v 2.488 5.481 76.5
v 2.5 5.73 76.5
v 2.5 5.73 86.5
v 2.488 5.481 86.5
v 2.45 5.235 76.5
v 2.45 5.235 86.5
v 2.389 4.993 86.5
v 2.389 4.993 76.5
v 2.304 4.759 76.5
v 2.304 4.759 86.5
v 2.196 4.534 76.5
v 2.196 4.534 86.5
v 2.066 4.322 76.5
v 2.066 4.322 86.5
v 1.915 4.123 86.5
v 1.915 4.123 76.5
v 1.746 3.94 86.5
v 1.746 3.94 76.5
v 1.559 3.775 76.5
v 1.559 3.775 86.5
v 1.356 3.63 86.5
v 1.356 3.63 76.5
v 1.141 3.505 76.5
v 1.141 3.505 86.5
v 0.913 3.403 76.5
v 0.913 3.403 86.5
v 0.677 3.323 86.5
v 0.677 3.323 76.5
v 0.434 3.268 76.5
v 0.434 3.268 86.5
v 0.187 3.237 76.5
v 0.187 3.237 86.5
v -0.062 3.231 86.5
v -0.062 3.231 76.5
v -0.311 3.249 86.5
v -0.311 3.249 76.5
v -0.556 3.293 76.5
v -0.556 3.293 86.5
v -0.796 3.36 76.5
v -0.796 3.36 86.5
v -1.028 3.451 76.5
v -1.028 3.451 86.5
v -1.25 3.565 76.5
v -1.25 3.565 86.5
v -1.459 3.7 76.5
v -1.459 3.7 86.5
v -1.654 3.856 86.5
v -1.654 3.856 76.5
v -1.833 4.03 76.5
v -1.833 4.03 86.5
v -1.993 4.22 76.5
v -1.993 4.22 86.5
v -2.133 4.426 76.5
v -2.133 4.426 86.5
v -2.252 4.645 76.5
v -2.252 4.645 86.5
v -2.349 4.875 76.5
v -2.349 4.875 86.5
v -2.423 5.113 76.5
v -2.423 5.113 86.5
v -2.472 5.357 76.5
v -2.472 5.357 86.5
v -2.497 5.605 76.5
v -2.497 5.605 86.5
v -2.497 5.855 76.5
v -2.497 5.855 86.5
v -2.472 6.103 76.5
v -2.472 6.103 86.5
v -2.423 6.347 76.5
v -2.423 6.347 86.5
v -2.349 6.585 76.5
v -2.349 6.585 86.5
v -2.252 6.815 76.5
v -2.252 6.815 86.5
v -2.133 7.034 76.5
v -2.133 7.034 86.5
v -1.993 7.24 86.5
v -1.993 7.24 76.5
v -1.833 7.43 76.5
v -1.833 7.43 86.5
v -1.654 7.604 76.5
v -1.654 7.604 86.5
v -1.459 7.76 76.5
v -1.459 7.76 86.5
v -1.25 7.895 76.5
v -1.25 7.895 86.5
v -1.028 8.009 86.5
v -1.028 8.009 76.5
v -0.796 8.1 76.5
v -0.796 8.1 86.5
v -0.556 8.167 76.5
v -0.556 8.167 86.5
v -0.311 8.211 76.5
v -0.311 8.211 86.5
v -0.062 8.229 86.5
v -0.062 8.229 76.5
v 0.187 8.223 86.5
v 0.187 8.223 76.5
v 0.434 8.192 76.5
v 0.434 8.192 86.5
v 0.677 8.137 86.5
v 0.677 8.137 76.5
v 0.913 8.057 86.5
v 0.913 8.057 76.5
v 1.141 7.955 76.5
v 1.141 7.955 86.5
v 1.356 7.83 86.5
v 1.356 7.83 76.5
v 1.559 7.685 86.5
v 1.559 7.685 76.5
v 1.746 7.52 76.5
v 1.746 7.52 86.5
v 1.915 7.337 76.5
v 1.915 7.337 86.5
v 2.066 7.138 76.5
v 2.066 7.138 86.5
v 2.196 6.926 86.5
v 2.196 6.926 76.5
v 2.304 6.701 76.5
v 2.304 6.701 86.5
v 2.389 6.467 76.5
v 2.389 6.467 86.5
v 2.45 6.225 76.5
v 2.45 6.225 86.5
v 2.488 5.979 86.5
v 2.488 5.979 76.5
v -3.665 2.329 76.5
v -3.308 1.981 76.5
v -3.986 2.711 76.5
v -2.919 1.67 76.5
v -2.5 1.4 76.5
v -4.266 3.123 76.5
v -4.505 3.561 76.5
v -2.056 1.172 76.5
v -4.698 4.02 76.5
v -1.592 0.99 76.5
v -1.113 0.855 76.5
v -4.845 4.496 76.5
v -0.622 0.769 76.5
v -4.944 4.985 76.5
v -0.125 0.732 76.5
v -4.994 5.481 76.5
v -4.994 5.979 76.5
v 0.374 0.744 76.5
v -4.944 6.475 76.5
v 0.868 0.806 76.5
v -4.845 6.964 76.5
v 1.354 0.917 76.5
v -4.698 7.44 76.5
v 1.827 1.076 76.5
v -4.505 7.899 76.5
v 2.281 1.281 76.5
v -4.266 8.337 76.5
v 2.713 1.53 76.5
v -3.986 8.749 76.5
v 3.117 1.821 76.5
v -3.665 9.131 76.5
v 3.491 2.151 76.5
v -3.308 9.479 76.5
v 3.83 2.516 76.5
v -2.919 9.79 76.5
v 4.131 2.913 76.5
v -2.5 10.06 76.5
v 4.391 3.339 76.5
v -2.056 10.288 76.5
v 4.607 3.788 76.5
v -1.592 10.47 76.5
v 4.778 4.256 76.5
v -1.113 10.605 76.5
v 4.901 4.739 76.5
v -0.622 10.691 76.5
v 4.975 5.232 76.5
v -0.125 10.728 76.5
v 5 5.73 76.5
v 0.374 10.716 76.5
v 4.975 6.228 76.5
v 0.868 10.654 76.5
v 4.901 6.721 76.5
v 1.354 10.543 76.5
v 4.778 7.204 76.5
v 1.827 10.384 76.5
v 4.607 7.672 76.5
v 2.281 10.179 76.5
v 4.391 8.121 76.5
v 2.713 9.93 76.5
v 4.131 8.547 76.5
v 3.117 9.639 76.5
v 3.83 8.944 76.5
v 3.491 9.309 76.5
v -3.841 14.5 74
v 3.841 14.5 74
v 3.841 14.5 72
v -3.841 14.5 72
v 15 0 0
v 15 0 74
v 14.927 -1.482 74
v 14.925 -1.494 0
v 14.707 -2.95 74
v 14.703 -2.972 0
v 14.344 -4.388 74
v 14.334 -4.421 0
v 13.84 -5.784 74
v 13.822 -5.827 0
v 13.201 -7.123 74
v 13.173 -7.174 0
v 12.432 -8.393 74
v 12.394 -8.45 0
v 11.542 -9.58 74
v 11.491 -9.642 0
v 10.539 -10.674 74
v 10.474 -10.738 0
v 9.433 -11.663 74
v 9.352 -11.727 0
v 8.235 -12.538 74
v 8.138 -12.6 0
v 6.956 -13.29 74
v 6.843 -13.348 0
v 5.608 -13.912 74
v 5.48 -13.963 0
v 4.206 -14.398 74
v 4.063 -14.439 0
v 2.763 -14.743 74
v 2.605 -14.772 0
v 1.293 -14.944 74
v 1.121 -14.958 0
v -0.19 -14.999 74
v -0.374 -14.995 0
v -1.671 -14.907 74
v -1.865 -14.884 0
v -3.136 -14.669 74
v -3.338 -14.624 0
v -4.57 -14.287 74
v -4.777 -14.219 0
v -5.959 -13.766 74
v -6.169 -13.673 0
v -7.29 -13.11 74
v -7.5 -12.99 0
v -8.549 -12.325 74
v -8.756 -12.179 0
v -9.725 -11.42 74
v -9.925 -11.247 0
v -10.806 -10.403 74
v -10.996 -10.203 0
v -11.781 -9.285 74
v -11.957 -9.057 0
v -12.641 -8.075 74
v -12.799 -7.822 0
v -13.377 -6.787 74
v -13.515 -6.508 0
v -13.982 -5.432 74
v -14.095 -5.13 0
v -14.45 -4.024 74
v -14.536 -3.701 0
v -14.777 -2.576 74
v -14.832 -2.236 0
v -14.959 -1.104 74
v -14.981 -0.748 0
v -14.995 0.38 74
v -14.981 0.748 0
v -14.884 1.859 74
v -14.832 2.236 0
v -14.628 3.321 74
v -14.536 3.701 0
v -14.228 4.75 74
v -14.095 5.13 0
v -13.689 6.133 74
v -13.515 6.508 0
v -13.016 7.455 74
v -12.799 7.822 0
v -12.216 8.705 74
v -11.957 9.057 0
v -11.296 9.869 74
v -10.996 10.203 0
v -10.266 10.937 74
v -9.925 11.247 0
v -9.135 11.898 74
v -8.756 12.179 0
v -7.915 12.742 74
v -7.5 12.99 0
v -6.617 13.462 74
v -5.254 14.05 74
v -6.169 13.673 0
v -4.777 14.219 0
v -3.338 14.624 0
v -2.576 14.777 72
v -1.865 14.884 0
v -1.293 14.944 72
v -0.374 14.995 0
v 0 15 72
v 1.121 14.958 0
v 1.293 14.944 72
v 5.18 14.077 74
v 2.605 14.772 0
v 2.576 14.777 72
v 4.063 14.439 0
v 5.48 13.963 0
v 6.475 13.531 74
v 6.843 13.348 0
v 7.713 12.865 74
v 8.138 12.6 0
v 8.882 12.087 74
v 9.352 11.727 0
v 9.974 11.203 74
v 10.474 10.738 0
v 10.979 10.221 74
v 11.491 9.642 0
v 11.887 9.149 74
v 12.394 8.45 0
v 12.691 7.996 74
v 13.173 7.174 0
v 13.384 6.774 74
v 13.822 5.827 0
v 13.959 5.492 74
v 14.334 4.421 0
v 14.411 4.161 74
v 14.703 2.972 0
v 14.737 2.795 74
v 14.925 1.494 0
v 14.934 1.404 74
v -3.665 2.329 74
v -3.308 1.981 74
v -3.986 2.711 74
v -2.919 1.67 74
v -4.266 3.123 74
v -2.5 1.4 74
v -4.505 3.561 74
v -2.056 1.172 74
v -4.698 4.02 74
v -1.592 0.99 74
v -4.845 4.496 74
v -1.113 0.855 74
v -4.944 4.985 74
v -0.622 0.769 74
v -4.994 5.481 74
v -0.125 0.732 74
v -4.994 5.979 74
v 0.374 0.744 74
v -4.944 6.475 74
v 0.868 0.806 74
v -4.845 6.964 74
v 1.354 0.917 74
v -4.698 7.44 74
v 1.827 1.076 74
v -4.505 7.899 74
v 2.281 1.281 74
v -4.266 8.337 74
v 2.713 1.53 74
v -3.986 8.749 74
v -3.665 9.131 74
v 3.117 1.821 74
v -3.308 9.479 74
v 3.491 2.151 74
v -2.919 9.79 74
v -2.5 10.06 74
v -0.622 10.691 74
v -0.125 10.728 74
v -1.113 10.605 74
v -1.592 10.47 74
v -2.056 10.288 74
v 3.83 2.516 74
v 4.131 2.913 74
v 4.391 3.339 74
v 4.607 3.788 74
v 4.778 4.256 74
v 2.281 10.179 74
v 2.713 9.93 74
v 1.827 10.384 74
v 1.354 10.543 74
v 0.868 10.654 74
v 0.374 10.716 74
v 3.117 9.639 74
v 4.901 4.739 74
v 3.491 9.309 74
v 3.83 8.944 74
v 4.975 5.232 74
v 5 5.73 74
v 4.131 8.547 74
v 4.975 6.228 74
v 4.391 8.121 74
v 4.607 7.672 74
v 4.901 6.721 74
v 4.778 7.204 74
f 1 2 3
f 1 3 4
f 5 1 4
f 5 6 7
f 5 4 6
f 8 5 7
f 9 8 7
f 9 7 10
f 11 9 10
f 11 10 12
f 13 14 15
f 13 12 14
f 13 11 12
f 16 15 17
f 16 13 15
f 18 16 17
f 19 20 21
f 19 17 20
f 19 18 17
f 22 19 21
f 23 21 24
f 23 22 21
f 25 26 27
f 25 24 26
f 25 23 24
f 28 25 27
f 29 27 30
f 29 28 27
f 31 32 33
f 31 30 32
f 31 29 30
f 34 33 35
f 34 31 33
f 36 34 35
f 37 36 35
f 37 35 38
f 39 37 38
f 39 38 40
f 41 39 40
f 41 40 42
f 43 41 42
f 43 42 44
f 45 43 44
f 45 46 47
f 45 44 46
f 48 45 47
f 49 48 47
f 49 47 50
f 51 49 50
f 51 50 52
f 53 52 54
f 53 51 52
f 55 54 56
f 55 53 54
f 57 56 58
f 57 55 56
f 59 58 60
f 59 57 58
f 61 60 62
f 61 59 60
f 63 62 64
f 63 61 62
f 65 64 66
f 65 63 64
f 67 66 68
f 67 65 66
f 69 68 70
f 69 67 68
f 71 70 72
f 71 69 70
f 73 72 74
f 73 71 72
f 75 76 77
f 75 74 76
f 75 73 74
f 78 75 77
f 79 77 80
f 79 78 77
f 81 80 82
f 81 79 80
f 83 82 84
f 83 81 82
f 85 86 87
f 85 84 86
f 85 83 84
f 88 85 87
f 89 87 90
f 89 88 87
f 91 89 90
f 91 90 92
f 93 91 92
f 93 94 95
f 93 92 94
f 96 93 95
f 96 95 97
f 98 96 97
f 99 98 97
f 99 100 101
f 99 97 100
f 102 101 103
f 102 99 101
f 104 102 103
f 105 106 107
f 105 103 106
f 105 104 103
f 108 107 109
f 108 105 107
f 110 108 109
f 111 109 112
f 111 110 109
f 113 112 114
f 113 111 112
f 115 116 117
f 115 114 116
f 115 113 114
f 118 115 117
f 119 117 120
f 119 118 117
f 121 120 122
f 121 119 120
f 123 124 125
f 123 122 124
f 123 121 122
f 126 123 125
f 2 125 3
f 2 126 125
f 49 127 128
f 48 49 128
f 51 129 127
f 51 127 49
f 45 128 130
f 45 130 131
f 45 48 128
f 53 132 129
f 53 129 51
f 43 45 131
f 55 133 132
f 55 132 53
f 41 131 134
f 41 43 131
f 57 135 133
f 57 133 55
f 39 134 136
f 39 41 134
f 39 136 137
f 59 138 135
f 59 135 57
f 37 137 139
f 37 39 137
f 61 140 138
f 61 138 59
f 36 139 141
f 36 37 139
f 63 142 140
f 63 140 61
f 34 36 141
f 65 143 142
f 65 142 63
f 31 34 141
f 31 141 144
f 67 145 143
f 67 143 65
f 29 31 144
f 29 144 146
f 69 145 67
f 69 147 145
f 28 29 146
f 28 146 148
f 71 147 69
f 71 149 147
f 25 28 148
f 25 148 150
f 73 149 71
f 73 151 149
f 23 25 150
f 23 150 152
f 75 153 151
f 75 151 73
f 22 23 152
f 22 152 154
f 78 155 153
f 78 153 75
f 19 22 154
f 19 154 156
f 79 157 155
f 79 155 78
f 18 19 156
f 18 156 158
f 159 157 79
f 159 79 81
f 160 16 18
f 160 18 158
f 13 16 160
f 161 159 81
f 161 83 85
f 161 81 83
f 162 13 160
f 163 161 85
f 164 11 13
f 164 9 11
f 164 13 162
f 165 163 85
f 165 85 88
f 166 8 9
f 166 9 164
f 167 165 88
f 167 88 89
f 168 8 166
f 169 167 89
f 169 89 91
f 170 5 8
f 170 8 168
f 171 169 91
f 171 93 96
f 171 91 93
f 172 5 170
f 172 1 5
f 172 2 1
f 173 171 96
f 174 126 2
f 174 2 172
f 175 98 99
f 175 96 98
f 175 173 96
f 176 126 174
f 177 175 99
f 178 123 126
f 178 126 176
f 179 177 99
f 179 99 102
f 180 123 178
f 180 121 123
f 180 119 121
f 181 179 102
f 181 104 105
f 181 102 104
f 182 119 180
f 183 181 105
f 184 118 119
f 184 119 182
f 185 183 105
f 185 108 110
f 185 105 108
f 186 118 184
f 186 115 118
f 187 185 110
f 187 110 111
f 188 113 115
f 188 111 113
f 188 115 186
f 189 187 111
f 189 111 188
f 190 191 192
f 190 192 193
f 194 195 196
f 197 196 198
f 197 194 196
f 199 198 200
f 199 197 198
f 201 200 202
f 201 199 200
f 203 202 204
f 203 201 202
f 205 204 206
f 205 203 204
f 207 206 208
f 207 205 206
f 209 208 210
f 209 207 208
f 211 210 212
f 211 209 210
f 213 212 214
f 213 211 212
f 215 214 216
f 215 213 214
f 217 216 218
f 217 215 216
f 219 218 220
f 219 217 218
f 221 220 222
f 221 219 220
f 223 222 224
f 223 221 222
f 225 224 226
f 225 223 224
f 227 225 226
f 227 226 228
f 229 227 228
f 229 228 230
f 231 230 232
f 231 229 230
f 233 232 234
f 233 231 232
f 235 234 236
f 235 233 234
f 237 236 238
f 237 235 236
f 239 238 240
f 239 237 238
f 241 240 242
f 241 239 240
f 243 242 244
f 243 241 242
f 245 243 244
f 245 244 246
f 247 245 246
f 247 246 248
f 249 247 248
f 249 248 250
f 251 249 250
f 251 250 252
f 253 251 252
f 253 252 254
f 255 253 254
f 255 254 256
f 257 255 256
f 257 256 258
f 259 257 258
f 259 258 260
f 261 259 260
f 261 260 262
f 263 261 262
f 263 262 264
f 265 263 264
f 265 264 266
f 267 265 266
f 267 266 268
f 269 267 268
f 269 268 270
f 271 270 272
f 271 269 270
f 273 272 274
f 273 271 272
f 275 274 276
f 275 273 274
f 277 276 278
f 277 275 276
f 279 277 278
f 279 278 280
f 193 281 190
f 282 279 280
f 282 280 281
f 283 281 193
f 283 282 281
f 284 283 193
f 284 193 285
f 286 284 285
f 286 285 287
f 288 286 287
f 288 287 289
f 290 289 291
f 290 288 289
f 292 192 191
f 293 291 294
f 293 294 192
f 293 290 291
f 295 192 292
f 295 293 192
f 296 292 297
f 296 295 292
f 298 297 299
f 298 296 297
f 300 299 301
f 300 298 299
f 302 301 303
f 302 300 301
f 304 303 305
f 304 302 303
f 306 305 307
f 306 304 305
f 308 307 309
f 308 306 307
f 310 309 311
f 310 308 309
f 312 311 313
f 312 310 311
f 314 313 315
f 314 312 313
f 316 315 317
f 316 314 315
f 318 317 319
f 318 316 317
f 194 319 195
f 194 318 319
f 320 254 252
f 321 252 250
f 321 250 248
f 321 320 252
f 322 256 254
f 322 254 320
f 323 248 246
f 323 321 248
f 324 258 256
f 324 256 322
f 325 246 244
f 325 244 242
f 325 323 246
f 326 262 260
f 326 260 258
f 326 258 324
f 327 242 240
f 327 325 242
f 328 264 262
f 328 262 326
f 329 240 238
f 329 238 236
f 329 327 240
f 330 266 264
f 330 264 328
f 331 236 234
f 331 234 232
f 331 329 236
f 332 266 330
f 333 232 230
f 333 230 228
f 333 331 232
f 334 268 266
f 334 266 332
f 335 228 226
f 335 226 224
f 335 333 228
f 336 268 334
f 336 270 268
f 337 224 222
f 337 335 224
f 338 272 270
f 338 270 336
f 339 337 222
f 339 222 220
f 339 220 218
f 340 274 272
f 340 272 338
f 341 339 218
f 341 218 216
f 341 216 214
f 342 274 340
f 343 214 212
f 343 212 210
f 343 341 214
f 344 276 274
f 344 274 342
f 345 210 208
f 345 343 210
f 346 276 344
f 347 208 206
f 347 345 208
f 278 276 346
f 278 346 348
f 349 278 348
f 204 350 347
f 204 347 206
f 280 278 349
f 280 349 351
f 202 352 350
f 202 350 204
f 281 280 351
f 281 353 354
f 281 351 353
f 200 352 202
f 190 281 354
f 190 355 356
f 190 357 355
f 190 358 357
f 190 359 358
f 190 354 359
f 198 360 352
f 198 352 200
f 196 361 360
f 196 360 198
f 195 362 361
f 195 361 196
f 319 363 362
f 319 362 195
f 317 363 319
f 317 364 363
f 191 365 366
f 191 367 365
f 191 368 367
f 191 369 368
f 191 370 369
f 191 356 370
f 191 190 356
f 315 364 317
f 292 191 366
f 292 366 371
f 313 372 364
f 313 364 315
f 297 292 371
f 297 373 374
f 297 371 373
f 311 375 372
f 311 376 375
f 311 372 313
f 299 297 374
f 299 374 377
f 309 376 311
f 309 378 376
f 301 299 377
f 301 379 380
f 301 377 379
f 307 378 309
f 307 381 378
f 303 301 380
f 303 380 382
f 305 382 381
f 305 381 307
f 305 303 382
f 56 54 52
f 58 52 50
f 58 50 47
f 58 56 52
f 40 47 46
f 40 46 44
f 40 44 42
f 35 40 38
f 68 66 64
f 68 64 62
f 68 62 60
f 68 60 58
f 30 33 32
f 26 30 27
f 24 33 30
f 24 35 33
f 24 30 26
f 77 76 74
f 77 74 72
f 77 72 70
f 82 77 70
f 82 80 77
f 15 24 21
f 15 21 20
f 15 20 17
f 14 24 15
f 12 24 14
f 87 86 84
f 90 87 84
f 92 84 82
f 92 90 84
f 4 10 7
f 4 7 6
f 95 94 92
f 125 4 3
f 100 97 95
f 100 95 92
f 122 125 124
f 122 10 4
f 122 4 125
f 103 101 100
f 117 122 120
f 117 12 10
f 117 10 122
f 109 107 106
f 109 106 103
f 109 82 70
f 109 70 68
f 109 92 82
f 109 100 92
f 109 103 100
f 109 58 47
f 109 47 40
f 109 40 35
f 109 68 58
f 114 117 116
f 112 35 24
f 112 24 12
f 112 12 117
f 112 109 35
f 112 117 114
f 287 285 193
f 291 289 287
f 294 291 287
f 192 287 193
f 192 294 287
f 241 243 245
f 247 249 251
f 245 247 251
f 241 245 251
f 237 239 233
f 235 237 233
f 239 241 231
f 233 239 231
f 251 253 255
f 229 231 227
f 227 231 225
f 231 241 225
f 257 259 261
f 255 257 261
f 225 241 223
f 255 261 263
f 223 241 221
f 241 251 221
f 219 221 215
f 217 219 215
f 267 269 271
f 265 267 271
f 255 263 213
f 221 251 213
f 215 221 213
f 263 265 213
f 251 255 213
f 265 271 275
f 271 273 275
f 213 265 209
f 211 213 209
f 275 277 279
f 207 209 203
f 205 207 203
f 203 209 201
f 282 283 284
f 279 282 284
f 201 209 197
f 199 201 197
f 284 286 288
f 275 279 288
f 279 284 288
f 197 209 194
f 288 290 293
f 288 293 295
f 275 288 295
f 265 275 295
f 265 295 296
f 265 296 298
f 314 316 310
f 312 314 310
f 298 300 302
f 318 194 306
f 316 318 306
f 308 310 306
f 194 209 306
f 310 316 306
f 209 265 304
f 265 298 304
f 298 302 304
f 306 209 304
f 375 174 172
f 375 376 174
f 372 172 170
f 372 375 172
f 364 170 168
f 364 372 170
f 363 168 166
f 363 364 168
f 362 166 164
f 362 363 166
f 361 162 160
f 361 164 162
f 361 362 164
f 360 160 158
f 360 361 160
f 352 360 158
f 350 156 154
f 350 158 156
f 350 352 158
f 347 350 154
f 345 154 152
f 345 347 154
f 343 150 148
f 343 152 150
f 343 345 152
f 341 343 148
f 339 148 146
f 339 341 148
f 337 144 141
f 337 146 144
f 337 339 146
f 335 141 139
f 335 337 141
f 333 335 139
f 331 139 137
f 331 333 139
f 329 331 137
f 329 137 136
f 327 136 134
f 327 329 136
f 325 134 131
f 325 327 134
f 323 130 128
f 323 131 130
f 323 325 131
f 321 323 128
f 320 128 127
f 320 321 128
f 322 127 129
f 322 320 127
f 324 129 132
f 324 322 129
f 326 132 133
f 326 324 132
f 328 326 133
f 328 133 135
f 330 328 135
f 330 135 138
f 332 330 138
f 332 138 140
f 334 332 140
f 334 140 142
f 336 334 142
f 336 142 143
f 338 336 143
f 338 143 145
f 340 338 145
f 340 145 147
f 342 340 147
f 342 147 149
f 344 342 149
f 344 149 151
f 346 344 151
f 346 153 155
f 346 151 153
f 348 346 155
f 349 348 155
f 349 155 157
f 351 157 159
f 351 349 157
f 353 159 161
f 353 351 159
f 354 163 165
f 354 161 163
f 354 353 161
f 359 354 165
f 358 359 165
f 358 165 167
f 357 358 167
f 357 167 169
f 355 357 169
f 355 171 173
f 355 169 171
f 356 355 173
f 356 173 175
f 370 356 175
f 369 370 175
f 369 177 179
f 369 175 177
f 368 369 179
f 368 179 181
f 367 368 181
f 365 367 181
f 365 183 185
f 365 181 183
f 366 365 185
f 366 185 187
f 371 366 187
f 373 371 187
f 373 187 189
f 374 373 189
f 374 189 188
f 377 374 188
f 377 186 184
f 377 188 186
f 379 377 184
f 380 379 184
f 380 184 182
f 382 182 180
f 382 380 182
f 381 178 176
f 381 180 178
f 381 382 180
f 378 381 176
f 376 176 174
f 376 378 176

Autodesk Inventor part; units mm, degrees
ref_plane "YZ Plane" through (0, 0, 0) normal (1, 0, 0) x (0, 1, 0)
ref_plane "XY Plane" through (0, 0, 0) normal (0, 0, 1) x (1, 0, 0)
sketch "Sketch1" plane through (0, 0, 0) normal (0, 0, 1) x (1, 0, 0)
  circle A0 centre (0, 0) radius 15
  dimension "d0" = 30
extrude "Extrusion1" add sketch "Sketch1" along normal blind 74
sketch "Sketch2" plane through (0, 0, 74) normal (0, 0, 1) x (1, 0, 0)
  circle A0 centre (0, 0) radius 15 projected
  circle A1 centre (0, 5.73) radius 5
  dimension "d3" = 10
  dimension "d4" = 15.73
extrude "Extrusion2" add sketch "Sketch2" along normal blind 2.5 contours A1
sketch "Sketch3" plane through (0, 5.73, 76.5) normal (0, 0, 1) x (1, 0, 0)
  circle A0 centre (0, 0) radius 5 projected
  circle A1 centre (0, 0) radius 2.5
  point P0 (0, -5.73)
  dimension "d7" = 5
extrude "Extrusion3" add sketch "Sketch3" along normal blind 10 contours A1
sketch "Sketch4" plane through (0, 0, 0) normal (0, 1, 0) x (-1, 0, 0)
  point P0 (0, 0)
ref_plane "Work Plane1" through (0, 15, 0) normal (0, 1, 0) x (-1, 0, 0)
sketch "Sketch5" plane through (0, 15, 0) normal (0, 1, 0) x (-1, 0, 0)
  line L0 (-5, 74) -> (5, 74)
  line L1 (5, 74) -> (5, 72)
  line L2 (5, 72) -> (-5, 72)
  line L3 (-5, 72) -> (-5, 74)
  line L4 (-15, 74) -> (15, 74) projected
  point P0 (0, 0)
  point P1 (0, 74)
  dimension "d11" = 10
  dimension "d12" = 2
extrude "Extrusion4" cut sketch "Sketch5" against normal blind 0.5
properties part number "Hjul Motor"
